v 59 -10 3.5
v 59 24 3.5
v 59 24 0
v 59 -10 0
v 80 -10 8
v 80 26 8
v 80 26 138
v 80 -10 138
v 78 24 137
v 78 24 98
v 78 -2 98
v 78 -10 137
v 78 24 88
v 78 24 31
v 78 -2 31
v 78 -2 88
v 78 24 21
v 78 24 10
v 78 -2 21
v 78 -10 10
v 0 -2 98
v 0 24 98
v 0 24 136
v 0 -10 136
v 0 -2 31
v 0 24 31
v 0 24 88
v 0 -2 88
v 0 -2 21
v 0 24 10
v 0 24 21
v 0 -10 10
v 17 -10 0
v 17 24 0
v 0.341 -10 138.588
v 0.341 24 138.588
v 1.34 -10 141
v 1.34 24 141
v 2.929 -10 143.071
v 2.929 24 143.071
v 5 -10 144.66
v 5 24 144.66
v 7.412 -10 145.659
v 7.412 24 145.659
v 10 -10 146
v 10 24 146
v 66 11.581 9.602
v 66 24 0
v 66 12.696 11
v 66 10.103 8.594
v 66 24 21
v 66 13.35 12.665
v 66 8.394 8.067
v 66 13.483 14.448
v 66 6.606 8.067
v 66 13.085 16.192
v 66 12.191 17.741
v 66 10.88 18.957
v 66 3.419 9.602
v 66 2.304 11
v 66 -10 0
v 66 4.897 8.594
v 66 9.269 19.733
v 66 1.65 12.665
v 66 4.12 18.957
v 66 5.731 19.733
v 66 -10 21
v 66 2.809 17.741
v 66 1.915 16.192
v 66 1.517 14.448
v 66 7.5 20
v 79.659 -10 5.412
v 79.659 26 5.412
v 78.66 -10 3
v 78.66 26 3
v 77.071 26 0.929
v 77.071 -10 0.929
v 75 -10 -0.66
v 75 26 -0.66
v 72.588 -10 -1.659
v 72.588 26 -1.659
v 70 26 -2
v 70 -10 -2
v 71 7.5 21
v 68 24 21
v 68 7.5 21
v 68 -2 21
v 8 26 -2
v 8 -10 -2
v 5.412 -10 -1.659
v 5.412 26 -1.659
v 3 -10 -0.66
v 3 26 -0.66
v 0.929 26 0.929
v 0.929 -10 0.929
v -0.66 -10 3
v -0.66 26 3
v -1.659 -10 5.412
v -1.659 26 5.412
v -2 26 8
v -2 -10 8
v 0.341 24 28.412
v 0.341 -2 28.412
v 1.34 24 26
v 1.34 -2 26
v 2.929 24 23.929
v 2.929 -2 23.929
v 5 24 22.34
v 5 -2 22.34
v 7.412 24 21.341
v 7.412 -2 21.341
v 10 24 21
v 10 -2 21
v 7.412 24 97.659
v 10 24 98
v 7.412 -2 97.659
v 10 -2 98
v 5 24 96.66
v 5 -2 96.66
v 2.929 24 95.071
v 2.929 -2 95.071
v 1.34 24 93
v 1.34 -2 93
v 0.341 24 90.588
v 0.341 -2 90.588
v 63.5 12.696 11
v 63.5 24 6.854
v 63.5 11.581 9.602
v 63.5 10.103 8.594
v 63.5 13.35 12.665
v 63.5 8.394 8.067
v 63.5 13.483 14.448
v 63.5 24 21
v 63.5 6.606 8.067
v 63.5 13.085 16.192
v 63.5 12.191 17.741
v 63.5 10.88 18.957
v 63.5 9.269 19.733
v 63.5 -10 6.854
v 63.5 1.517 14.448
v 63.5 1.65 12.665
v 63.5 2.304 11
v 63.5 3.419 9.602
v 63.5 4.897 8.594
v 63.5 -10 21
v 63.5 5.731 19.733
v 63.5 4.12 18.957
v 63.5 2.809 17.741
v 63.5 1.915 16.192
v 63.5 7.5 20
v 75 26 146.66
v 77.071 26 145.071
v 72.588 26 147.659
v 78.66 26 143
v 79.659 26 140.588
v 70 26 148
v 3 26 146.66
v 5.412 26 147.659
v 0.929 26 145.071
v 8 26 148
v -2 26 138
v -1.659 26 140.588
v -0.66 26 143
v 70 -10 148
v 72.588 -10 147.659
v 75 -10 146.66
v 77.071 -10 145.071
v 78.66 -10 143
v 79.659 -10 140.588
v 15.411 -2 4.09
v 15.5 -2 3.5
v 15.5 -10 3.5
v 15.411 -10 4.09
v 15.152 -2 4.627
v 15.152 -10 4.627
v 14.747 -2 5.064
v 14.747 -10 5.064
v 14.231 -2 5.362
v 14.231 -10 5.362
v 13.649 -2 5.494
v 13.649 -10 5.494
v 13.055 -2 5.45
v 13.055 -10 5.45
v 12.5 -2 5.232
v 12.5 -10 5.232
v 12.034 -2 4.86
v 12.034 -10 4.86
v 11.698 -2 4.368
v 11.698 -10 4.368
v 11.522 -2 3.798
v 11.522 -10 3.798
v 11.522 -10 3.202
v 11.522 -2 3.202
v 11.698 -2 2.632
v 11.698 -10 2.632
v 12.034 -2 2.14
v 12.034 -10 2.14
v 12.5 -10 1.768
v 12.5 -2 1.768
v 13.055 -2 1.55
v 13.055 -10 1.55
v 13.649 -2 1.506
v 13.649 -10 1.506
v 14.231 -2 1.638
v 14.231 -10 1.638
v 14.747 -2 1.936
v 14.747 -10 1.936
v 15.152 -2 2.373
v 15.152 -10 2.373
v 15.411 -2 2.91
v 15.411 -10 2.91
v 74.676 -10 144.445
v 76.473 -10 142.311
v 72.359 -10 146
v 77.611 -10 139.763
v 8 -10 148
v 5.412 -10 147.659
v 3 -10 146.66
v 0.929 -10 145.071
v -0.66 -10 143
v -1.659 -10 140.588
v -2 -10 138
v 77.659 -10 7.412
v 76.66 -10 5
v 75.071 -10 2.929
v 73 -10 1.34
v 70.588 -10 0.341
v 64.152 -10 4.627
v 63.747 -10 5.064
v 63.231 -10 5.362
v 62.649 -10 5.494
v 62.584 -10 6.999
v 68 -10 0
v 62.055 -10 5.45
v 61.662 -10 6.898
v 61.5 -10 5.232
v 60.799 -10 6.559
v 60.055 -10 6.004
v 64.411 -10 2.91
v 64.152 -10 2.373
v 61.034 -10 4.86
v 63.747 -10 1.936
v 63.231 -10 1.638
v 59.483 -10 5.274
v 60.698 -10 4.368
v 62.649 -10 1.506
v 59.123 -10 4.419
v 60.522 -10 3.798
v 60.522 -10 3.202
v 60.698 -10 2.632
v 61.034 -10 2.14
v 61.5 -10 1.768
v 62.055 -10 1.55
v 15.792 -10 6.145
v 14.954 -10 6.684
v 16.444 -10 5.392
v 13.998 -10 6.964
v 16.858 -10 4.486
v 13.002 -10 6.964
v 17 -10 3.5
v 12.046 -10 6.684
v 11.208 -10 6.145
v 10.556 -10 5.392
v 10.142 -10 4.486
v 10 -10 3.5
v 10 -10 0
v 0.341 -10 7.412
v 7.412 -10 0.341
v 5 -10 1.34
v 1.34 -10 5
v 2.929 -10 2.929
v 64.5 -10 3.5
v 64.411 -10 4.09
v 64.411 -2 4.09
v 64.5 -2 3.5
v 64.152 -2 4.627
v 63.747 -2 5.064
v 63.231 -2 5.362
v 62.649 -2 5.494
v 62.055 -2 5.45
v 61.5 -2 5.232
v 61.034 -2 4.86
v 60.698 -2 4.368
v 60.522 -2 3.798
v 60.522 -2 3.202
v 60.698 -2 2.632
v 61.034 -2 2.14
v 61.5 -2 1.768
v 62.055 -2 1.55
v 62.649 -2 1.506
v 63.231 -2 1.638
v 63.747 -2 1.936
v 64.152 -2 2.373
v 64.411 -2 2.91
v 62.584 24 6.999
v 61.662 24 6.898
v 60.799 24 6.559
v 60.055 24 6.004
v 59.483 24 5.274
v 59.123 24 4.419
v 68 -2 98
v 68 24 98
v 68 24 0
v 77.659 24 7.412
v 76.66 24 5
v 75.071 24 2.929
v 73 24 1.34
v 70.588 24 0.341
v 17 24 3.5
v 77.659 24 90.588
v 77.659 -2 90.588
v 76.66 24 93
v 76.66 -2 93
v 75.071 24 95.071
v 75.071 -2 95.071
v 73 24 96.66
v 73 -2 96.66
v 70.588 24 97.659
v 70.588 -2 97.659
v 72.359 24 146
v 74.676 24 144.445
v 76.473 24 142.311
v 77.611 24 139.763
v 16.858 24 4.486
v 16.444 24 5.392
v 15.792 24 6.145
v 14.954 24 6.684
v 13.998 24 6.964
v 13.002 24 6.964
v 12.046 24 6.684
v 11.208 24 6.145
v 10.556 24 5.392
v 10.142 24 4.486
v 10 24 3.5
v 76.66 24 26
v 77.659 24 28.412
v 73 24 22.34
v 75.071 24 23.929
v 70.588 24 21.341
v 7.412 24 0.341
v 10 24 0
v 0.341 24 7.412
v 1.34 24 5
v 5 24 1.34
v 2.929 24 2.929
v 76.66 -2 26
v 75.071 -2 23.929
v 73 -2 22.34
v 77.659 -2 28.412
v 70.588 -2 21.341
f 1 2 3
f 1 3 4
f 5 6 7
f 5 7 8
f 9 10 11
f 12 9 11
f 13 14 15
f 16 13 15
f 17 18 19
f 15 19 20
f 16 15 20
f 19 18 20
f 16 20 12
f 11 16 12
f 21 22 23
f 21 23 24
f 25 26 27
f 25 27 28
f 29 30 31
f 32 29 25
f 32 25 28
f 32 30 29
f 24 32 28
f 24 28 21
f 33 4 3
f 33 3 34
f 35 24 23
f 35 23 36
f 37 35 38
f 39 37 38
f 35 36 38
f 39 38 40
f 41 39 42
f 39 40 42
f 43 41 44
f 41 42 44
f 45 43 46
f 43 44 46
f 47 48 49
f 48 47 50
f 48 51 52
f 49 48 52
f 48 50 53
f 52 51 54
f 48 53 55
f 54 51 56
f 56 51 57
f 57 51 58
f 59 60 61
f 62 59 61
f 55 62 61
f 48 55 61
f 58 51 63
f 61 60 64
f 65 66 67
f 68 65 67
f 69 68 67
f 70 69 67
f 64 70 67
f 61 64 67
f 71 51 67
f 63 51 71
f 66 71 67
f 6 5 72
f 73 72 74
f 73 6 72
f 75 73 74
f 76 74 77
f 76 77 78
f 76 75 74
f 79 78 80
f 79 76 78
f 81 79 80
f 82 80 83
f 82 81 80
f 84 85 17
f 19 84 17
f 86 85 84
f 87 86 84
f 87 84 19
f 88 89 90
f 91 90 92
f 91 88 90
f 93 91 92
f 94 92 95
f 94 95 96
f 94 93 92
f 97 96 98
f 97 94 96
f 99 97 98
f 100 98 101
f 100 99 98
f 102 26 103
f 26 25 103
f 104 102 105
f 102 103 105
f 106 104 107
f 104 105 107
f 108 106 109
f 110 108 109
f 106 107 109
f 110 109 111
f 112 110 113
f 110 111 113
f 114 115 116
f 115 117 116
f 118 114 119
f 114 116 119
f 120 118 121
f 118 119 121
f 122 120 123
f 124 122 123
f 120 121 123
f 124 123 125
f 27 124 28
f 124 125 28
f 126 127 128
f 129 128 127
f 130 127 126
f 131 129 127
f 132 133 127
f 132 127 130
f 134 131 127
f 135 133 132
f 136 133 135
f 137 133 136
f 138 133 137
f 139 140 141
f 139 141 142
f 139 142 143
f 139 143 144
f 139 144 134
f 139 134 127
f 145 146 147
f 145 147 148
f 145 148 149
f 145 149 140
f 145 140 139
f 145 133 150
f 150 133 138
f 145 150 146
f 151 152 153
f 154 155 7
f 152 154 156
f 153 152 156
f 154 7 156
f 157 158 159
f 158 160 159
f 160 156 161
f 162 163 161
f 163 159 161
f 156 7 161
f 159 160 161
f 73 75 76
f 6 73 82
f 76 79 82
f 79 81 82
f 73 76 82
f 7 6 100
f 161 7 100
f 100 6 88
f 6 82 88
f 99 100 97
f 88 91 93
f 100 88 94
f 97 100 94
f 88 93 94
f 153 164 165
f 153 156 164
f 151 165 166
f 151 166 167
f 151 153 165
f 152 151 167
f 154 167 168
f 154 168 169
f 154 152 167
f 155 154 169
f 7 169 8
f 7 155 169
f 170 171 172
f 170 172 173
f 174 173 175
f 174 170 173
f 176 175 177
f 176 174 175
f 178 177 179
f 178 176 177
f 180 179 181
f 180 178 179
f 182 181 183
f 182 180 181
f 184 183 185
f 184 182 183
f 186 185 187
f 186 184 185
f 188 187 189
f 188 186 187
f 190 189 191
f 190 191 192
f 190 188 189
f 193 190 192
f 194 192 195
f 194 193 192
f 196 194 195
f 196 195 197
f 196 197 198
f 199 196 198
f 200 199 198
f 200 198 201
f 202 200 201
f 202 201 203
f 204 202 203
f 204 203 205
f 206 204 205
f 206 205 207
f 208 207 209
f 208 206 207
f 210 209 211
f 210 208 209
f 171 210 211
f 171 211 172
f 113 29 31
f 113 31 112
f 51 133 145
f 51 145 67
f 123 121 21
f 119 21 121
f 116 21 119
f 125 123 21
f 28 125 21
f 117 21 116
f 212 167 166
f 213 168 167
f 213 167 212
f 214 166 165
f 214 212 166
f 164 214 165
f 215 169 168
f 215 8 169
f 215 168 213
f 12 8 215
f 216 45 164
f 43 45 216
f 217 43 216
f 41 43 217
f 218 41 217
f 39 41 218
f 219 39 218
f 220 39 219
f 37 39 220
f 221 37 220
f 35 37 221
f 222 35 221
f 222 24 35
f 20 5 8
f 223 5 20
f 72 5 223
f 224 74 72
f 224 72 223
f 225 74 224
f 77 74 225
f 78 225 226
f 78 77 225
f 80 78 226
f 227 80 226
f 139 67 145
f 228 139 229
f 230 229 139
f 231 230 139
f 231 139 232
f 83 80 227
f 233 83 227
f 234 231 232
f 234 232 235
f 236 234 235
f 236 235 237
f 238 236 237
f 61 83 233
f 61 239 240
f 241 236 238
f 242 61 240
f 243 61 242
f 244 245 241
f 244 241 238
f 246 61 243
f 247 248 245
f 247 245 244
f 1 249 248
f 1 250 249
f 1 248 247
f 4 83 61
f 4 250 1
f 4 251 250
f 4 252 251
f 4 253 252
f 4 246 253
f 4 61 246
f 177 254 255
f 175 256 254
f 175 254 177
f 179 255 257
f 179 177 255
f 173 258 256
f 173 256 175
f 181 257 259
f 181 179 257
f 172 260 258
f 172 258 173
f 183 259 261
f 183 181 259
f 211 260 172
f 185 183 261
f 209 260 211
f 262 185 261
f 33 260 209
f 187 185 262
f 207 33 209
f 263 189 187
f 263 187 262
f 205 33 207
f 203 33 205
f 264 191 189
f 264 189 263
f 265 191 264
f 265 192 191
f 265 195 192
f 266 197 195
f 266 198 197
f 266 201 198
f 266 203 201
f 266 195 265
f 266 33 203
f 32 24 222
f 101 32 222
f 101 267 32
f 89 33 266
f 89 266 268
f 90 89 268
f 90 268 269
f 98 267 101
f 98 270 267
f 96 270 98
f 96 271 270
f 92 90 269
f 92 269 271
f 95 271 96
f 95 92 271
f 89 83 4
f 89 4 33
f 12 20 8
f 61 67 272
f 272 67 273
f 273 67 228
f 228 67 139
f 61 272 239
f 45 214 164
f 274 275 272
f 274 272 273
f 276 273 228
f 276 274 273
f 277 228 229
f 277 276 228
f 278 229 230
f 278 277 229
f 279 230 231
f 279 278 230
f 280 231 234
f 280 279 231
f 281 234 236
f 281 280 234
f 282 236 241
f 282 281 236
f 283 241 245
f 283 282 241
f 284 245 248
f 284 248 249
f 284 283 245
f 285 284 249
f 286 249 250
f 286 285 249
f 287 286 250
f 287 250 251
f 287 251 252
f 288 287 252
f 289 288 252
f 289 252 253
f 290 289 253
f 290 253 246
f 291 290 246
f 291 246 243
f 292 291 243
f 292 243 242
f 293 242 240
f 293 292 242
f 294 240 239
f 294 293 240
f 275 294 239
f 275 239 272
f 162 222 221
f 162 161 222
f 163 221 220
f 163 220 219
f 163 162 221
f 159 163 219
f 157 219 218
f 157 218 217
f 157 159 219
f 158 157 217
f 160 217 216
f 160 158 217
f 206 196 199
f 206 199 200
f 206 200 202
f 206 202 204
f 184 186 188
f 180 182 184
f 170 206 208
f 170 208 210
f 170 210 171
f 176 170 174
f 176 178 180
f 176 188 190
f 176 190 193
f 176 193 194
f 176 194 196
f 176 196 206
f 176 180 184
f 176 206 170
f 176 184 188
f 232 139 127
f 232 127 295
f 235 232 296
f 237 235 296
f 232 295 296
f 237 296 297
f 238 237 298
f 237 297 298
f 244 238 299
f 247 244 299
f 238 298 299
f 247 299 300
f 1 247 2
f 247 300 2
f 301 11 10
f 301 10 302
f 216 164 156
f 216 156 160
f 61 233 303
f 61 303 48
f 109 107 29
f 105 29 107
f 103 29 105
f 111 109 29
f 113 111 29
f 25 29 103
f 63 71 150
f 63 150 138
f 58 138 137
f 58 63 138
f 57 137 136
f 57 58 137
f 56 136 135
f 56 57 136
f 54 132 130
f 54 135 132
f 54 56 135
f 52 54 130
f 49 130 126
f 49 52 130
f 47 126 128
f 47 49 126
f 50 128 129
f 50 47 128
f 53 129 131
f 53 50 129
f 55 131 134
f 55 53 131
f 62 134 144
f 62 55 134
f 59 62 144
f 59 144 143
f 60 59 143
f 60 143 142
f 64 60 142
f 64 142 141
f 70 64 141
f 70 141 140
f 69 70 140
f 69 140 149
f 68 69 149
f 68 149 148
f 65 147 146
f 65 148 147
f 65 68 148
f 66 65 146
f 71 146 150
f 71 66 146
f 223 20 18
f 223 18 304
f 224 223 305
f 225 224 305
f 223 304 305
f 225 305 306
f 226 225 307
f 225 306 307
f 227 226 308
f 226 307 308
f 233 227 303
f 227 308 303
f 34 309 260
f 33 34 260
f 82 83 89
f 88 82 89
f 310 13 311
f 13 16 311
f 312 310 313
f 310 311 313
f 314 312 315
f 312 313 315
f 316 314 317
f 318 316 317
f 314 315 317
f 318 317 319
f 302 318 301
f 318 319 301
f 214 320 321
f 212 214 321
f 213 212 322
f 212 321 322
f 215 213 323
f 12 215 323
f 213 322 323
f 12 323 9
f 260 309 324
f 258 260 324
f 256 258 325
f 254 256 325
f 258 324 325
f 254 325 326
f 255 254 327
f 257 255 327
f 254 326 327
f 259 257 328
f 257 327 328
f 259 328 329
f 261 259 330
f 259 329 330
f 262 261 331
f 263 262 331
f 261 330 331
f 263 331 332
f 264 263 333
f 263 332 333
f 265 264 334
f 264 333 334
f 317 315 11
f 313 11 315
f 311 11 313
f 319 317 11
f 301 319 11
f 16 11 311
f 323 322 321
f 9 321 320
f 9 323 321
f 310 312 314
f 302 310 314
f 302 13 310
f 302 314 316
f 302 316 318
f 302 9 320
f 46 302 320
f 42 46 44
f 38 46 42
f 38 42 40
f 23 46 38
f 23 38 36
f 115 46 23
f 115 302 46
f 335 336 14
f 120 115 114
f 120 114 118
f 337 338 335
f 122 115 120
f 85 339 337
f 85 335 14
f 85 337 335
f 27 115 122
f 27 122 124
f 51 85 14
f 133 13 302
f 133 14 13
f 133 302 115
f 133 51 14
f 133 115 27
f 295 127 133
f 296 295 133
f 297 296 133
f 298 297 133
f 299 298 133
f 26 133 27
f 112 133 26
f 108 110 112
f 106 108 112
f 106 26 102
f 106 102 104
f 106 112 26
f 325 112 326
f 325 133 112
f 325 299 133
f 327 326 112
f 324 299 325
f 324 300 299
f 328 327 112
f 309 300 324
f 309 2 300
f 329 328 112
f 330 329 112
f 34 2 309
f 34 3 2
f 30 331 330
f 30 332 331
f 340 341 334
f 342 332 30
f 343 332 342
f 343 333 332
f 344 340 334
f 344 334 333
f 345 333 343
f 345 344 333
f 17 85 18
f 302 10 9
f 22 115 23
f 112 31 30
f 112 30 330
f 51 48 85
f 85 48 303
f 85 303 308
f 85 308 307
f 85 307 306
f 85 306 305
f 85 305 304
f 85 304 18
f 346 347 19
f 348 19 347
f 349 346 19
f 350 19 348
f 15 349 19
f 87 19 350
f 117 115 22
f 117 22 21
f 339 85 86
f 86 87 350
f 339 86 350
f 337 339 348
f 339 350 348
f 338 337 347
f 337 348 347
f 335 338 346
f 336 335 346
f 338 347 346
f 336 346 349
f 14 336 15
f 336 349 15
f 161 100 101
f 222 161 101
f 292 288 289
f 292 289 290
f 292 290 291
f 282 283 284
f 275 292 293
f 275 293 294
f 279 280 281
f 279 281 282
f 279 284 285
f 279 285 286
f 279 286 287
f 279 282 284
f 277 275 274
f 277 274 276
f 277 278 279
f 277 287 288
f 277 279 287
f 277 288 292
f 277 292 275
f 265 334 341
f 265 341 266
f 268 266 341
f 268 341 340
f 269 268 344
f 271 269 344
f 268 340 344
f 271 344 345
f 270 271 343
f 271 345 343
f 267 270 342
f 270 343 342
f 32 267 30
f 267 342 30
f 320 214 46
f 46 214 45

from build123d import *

# Parameters (mm, degrees)
CYLINDER022_R             = 2
CYLINDER022_DEPTH         = 8
CYLINDER026_R             = 7
CYLINDER026_DEPTH         = 5
CYLINDER025_R             = 6
CYLINDER025_DEPTH         = 20
FUSION007_PLACEMENT_ANGLE = 270
CYLINDER024_R             = 2
CYLINDER024_DEPTH         = 8
CYLINDER023_R             = 3.5
CYLINDER023_DEPTH         = 34
BOX022_W                  = 7
BOX022_H                  = 34
BOX022_DEPTH              = 3.5
BOX023_W                  = 7
BOX023_H                  = 34
BOX023_DEPTH              = 3.5
BOX024_W                  = 2.5
BOX024_H                  = 34
BOX024_DEPTH              = 17.5
CYLINDER017_W             = 10
CYLINDER017_H             = 26
CYLINDER017_ANGLE         = 90
BOX018_W                  = 10
BOX018_H                  = 26
BOX018_DEPTH              = 10
CUT018_PLACEMENT_ANGLE    = 180
CYLINDER018_W             = 10
CYLINDER018_H             = 26
CYLINDER018_ANGLE         = 90
BOX019_W                  = 10
BOX019_H                  = 26
BOX019_DEPTH              = 10
CUT019_PLACEMENT_ANGLE    = 270
CYLINDER019_W             = 10
CYLINDER019_H             = 26
CYLINDER019_ANGLE         = 90
BOX020_W                  = 10
BOX020_H                  = 26
BOX020_DEPTH              = 10
CYLINDER020_W             = 10
CYLINDER020_H             = 26
CYLINDER020_ANGLE         = 90
BOX021_W                  = 10
BOX021_H                  = 26
BOX021_DEPTH              = 10
CUT021_PLACEMENT_ANGLE    = 270
CYLINDER014_W             = 10
CYLINDER014_H             = 34
CYLINDER014_ANGLE         = 90
BOX015_W                  = 10
BOX015_H                  = 34
BOX015_DEPTH              = 10
CUT013_PLACEMENT_ANGLE    = 180
CYLINDER015_W             = 10
CYLINDER015_H             = 34
CYLINDER015_ANGLE         = 90
BOX016_W                  = 10
BOX016_H                  = 34
BOX016_DEPTH              = 10
CUT014_PLACEMENT_ANGLE    = 180
CYLINDER016_W             = 10
CYLINDER016_H             = 34
CYLINDER016_ANGLE         = 90
BOX017_W                  = 10
BOX017_H                  = 34
BOX017_DEPTH              = 10
CUT015_PITCH_ANGLE        = -90
CUT015_PLACEMENT_ANGLE    = 180
CYLINDER013_W             = 10
CYLINDER013_H             = 34
CYLINDER013_ANGLE         = 90
BOX013_W                  = 10
BOX013_H                  = 34
BOX013_DEPTH              = 10
CUT012_PITCH_ANGLE        = 90
CUT012_PLACEMENT_ANGLE    = -180
BOX014_W                  = 78
BOX014_H                  = 34
BOX014_DEPTH              = 146
CYLINDER009_W             = 10
CYLINDER009_H             = 36
CYLINDER009_ANGLE         = 90
BOX009_W                  = 10
BOX009_H                  = 36
BOX009_DEPTH              = 10
CUT007_PLACEMENT_ANGLE    = 180
CYLINDER010_W             = 10
CYLINDER010_H             = 36
CYLINDER010_ANGLE         = 90
BOX010_W                  = 10
BOX010_H                  = 36
BOX010_DEPTH              = 10
CUT008_PLACEMENT_ANGLE    = 180
CYLINDER011_W             = 10
CYLINDER011_H             = 36
CYLINDER011_ANGLE         = 90
BOX011_W                  = 10
BOX011_H                  = 36
BOX011_DEPTH              = 10
CUT009_PITCH_ANGLE        = -90
CUT009_PLACEMENT_ANGLE    = -180
CYLINDER008_W             = 10
CYLINDER008_H             = 36
CYLINDER008_ANGLE         = 90
BOX007_W                  = 10
BOX007_H                  = 36
BOX007_DEPTH              = 10
CUT006_PITCH_ANGLE        = 90
CUT006_PLACEMENT_ANGLE    = -180
BOX008_W                  = 82
BOX008_H                  = 36
BOX008_DEPTH              = 150
CYLINDER021_R             = 3.5
CYLINDER021_DEPTH         = 34


with BuildPart() as cylinder022:
    # Cylinder022 → Cylinder022 (new body)
    with BuildSketch(Plane(origin=(13.5, -2, 3.5), x_dir=(1, 0, 0), z_dir=(0, -1, 0))):
        Circle(CYLINDER022_R)
    extrude(amount=CYLINDER022_DEPTH)


with BuildPart() as cylinder026:
    # Cylinder026 → Cylinder026 (new body)
    with BuildSketch(Plane.XY):
        Circle(CYLINDER026_R)
    extrude(amount=CYLINDER026_DEPTH)


with BuildPart() as powerswitch:
    # Cylinder025 → Cylinder025 (new body)
    with BuildSketch(Plane.XY):
        Circle(CYLINDER025_R)
    extrude(amount=CYLINDER025_DEPTH)

    # Fusion007: union Cylinder026
    add(cylinder026.part)


with BuildPart() as powerswitch_1:
    # Fusion007 placement: moved
    add(powerswitch.part.moved(Location((71, 7.5, 14))).rotate(Axis((71, 7.5, 14), (0, 1, 0)), FUSION007_PLACEMENT_ANGLE))


with BuildPart() as basecuts:
    # Cylinder024 → Cylinder024 (new body)
    with BuildSketch(Plane(origin=(62.5, -2, 3.5), x_dir=(1, 0, 0), z_dir=(0, -1, 0))):
        Circle(CYLINDER024_R)
    extrude(amount=CYLINDER024_DEPTH)

    # Fusion010: union Cylinder022, powerSwitch
    add(cylinder022.part)
    add(powerswitch_1.part)


with BuildPart() as cylinder023:
    # Cylinder023 → Cylinder023 (new body)
    with BuildSketch(Plane(origin=(62.5, 24, 3.5), x_dir=(1, 0, 0), z_dir=(0, -1, 0))):
        Circle(CYLINDER023_R)
    extrude(amount=CYLINDER023_DEPTH)


with BuildPart() as cube017:
    # Box022 → Box022 (new body)
    with BuildSketch(Plane(origin=(10, 24, 3.5), x_dir=(1, 0, 0), z_dir=(0, 0, -1))):
        with Locations((3.5, 17)):
            Rectangle(BOX022_W, BOX022_H)
    extrude(amount=BOX022_DEPTH)


with BuildPart() as cube018:
    # Box023 → Box023 (new body)
    with BuildSketch(Plane(origin=(59, 24, 3.5), x_dir=(1, 0, 0), z_dir=(0, 0, -1))):
        with Locations((3.5, 17)):
            Rectangle(BOX023_W, BOX023_H)
    extrude(amount=BOX023_DEPTH)


with BuildPart() as cube019:
    # Box024 → Box024 (new body)
    with BuildSketch(Plane(origin=(63.5, 24, 21), x_dir=(1, 0, 0), z_dir=(0, 0, -1))):
        with Locations((1.25, 17)):
            Rectangle(BOX024_W, BOX024_H)
    extrude(amount=BOX024_DEPTH)


with BuildPart() as cylinder017:
    # Cylinder017 → Cylinder017 (revolve)
    with BuildSketch(Plane(origin=(0, 26, 0), x_dir=(1, 0, 0), z_dir=(0, 0, -1))):
        with Locations((5, 13)):
            Rectangle(CYLINDER017_W, CYLINDER017_H)
    revolve(axis=Axis((0, 26, 0), (0, -1, 0)), revolution_arc=CYLINDER017_ANGLE)


with BuildPart() as batterysupport:
    # Box018 → Box018 (new body)
    with BuildSketch(Plane(origin=(10, 26, 0), x_dir=(-1, 0, 0), z_dir=(0, 0, 1))):
        with Locations((5, 13)):
            Rectangle(BOX018_W, BOX018_H)
    extrude(amount=BOX018_DEPTH)

    # Cut018: cut Cylinder017
    add(cylinder017.part, mode=Mode.SUBTRACT)


with BuildPart() as batterysupport_1:
    # Cut018 placement: moved
    add(batterysupport.part.moved(Location((10, -2, 31))).rotate(Axis((10, -2, 31), (0, 1, 0)), CUT018_PLACEMENT_ANGLE))


with BuildPart() as cylinder018:
    # Cylinder018 → Cylinder018 (revolve)
    with BuildSketch(Plane(origin=(0, 26, 0), x_dir=(1, 0, 0), z_dir=(0, 0, -1))):
        with Locations((5, 13)):
            Rectangle(CYLINDER018_W, CYLINDER018_H)
    revolve(axis=Axis((0, 26, 0), (0, -1, 0)), revolution_arc=CYLINDER018_ANGLE)


with BuildPart() as batterysupport001:
    # Box019 → Box019 (new body)
    with BuildSketch(Plane(origin=(10, 26, 0), x_dir=(-1, 0, 0), z_dir=(0, 0, 1))):
        with Locations((5, 13)):
            Rectangle(BOX019_W, BOX019_H)
    extrude(amount=BOX019_DEPTH)

    # Cut019: cut Cylinder018
    add(cylinder018.part, mode=Mode.SUBTRACT)


with BuildPart() as batterysupport001_1:
    # Cut019 placement: moved
    add(batterysupport001.part.moved(Location((68, -2, 31))).rotate(Axis((68, -2, 31), (0, -1, 0)), CUT019_PLACEMENT_ANGLE))


with BuildPart() as cylinder019:
    # Cylinder019 → Cylinder019 (revolve)
    with BuildSketch(Plane(origin=(0, 26, 0), x_dir=(1, 0, 0), z_dir=(0, 0, -1))):
        with Locations((5, 13)):
            Rectangle(CYLINDER019_W, CYLINDER019_H)
    revolve(axis=Axis((0, 26, 0), (0, -1, 0)), revolution_arc=CYLINDER019_ANGLE)


with BuildPart() as batterysupport002:
    # Box020 → Box020 (new body)
    with BuildSketch(Plane(origin=(10, 26, 0), x_dir=(-1, 0, 0), z_dir=(0, 0, 1))):
        with Locations((5, 13)):
            Rectangle(BOX020_W, BOX020_H)
    extrude(amount=BOX020_DEPTH)

    # Cut020: cut Cylinder019
    add(cylinder019.part, mode=Mode.SUBTRACT)


with BuildPart() as batterysupport002_1:
    # Cut020 placement: moved
    add(batterysupport002.part.moved(Location((68, -2, 88))))


with BuildPart() as cylinder020:
    # Cylinder020 → Cylinder020 (revolve)
    with BuildSketch(Plane(origin=(0, 26, 0), x_dir=(1, 0, 0), z_dir=(0, 0, -1))):
        with Locations((5, 13)):
            Rectangle(CYLINDER020_W, CYLINDER020_H)
    revolve(axis=Axis((0, 26, 0), (0, -1, 0)), revolution_arc=CYLINDER020_ANGLE)


with BuildPart() as batterysupport003:
    # Box021 → Box021 (new body)
    with BuildSketch(Plane(origin=(10, 26, 0), x_dir=(-1, 0, 0), z_dir=(0, 0, 1))):
        with Locations((5, 13)):
            Rectangle(BOX021_W, BOX021_H)
    extrude(amount=BOX021_DEPTH)

    # Cut021: cut Cylinder020
    add(cylinder020.part, mode=Mode.SUBTRACT)


with BuildPart() as batterysupport003_1:
    # Cut021 placement: moved
    add(batterysupport003.part.moved(Location((10, -2, 88))).rotate(Axis((10, -2, 88), (0, 1, 0)), CUT021_PLACEMENT_ANGLE))


with BuildPart() as cylinder014:
    # Cylinder014 → Cylinder014 (revolve)
    with BuildSketch(Plane(origin=(0, 26, 0), x_dir=(1, 0, 0), z_dir=(0, 0, -1))):
        with Locations((5, 17)):
            Rectangle(CYLINDER014_W, CYLINDER014_H)
    revolve(axis=Axis((0, 26, 0), (0, -1, 0)), revolution_arc=CYLINDER014_ANGLE)


with BuildPart() as cut013:
    # Box015 → Box015 (new body)
    with BuildSketch(Plane(origin=(0, -8, 0), x_dir=(1, 0, 0), z_dir=(0, 0, 1))):
        with Locations((5, 17)):
            Rectangle(BOX015_W, BOX015_H)
    extrude(amount=BOX015_DEPTH)

    # Cut013: cut Cylinder014
    add(cylinder014.part, mode=Mode.SUBTRACT)


with BuildPart() as cut013_1:
    # Cut013 placement: moved
    add(cut013.part.moved(Location((70, 18, 8))).rotate(Axis((70, 18, 8), (1, 0, 0)), CUT013_PLACEMENT_ANGLE))


with BuildPart() as cylinder015:
    # Cylinder015 → Cylinder015 (revolve)
    with BuildSketch(Plane(origin=(0, 26, 0), x_dir=(1, 0, 0), z_dir=(0, 0, -1))):
        with Locations((5, 17)):
            Rectangle(CYLINDER015_W, CYLINDER015_H)
    revolve(axis=Axis((0, 26, 0), (0, -1, 0)), revolution_arc=CYLINDER015_ANGLE)


with BuildPart() as cut014:
    # Box016 → Box016 (new body)
    with BuildSketch(Plane(origin=(0, -8, 0), x_dir=(1, 0, 0), z_dir=(0, 0, 1))):
        with Locations((5, 17)):
            Rectangle(BOX016_W, BOX016_H)
    extrude(amount=BOX016_DEPTH)

    # Cut014: cut Cylinder015
    add(cylinder015.part, mode=Mode.SUBTRACT)


with BuildPart() as cut014_1:
    # Cut014 placement: moved
    add(cut014.part.moved(Location((12, 18, 134))).rotate(Axis((12, 18, 134), (0, 0, 1)), CUT014_PLACEMENT_ANGLE))


with BuildPart() as cylinder016:
    # Cylinder016 → Cylinder016 (revolve)
    with BuildSketch(Plane(origin=(0, 26, 0), x_dir=(1, 0, 0), z_dir=(0, 0, -1))):
        with Locations((5, 17)):
            Rectangle(CYLINDER016_W, CYLINDER016_H)
    revolve(axis=Axis((0, 26, 0), (0, -1, 0)), revolution_arc=CYLINDER016_ANGLE)


with BuildPart() as cut015:
    # Box017 → Box017 (new body)
    with BuildSketch(Plane(origin=(0, -8, 0), x_dir=(1, 0, 0), z_dir=(0, 0, 1))):
        with Locations((5, 17)):
            Rectangle(BOX017_W, BOX017_H)
    extrude(amount=BOX017_DEPTH)

    # Cut015: cut Cylinder016
    add(cylinder016.part, mode=Mode.SUBTRACT)


with BuildPart() as cut015_1:
    # Cut015 pitch: moved
    add(cut015.part.rotate(Axis((0, 0, 0), (0, 1, 0)), CUT015_PITCH_ANGLE))


with BuildPart() as cut015_2:
    # Cut015 placement: moved
    add(cut015_1.part.moved(Location((70, 18, 135))).rotate(Axis((70, 18, 135), (0, 0, 1)), CUT015_PLACEMENT_ANGLE))


with BuildPart() as cylinder013:
    # Cylinder013 → Cylinder013 (revolve)
    with BuildSketch(Plane(origin=(0, 26, 0), x_dir=(1, 0, 0), z_dir=(0, 0, -1))):
        with Locations((5, 17)):
            Rectangle(CYLINDER013_W, CYLINDER013_H)
    revolve(axis=Axis((0, 26, 0), (0, -1, 0)), revolution_arc=CYLINDER013_ANGLE)


with BuildPart() as fusion006:
    # Box013 → Box013 (new body)
    with BuildSketch(Plane(origin=(0, -8, 0), x_dir=(1, 0, 0), z_dir=(0, 0, 1))):
        with Locations((5, 17)):
            Rectangle(BOX013_W, BOX013_H)
    extrude(amount=BOX013_DEPTH)

    # Cut012: cut Cylinder013
    add(cylinder013.part, mode=Mode.SUBTRACT)


with BuildPart() as fusion006_1:
    # Cut012 pitch: moved
    add(fusion006.part.rotate(Axis((0, 0, 0), (0, 1, 0)), CUT012_PITCH_ANGLE))


with BuildPart() as fusion006_2:
    # Cut012 placement: moved
    add(fusion006_1.part.moved(Location((12, 18, 8))).rotate(Axis((12, 18, 8), (0, 0, 1)), CUT012_PLACEMENT_ANGLE))

    # Fusion006: union Cut013, Cut014, Cut015
    add(cut013_1.part)
    add(cut014_1.part)
    add(cut015_2.part)


with BuildPart() as baseout001:
    # Box014 → Box014 (new body)
    with BuildSketch(Plane(origin=(80, 26, -2), x_dir=(-1, 0, 0), z_dir=(0, 0, 1))):
        with Locations((39, 17)):
            Rectangle(BOX014_W, BOX014_H)
    extrude(amount=BOX014_DEPTH)

    # Cut016: cut Fusion006
    add(fusion006_2.part, mode=Mode.SUBTRACT)


with BuildPart() as baseout001_1:
    # Cut016 placement: moved
    add(baseout001.part.moved(Location((-2, -2, 2))))


with BuildPart() as cylinder009:
    # Cylinder009 → Cylinder009 (revolve)
    with BuildSketch(Plane(origin=(0, 26, 0), x_dir=(1, 0, 0), z_dir=(0, 0, -1))):
        with Locations((5, 18)):
            Rectangle(CYLINDER009_W, CYLINDER009_H)
    revolve(axis=Axis((0, 26, 0), (0, -1, 0)), revolution_arc=CYLINDER009_ANGLE)


with BuildPart() as cut007:
    # Box009 → Box009 (new body)
    with BuildSketch(Plane(origin=(0, -10, 0), x_dir=(1, 0, 0), z_dir=(0, 0, 1))):
        with Locations((5, 18)):
            Rectangle(BOX009_W, BOX009_H)
    extrude(amount=BOX009_DEPTH)

    # Cut007: cut Cylinder009
    add(cylinder009.part, mode=Mode.SUBTRACT)


with BuildPart() as cut007_1:
    # Cut007 placement: moved
    add(cut007.part.moved(Location((70, 18, 8))).rotate(Axis((70, 18, 8), (1, 0, 0)), CUT007_PLACEMENT_ANGLE))


with BuildPart() as cylinder010:
    # Cylinder010 → Cylinder010 (revolve)
    with BuildSketch(Plane(origin=(0, 26, 0), x_dir=(1, 0, 0), z_dir=(0, 0, -1))):
        with Locations((5, 18)):
            Rectangle(CYLINDER010_W, CYLINDER010_H)
    revolve(axis=Axis((0, 26, 0), (0, -1, 0)), revolution_arc=CYLINDER010_ANGLE)


with BuildPart() as cut008:
    # Box010 → Box010 (new body)
    with BuildSketch(Plane(origin=(0, -10, 0), x_dir=(1, 0, 0), z_dir=(0, 0, 1))):
        with Locations((5, 18)):
            Rectangle(BOX010_W, BOX010_H)
    extrude(amount=BOX010_DEPTH)

    # Cut008: cut Cylinder010
    add(cylinder010.part, mode=Mode.SUBTRACT)


with BuildPart() as cut008_1:
    # Cut008 placement: moved
    add(cut008.part.moved(Location((8, 18, 138))).rotate(Axis((8, 18, 138), (0, 0, 1)), CUT008_PLACEMENT_ANGLE))


with BuildPart() as cylinder011:
    # Cylinder011 → Cylinder011 (revolve)
    with BuildSketch(Plane(origin=(0, 26, 0), x_dir=(1, 0, 0), z_dir=(0, 0, -1))):
        with Locations((5, 18)):
            Rectangle(CYLINDER011_W, CYLINDER011_H)
    revolve(axis=Axis((0, 26, 0), (0, -1, 0)), revolution_arc=CYLINDER011_ANGLE)


with BuildPart() as cut009:
    # Box011 → Box011 (new body)
    with BuildSketch(Plane(origin=(0, -10, 0), x_dir=(1, 0, 0), z_dir=(0, 0, 1))):
        with Locations((5, 18)):
            Rectangle(BOX011_W, BOX011_H)
    extrude(amount=BOX011_DEPTH)

    # Cut009: cut Cylinder011
    add(cylinder011.part, mode=Mode.SUBTRACT)


with BuildPart() as cut009_1:
    # Cut009 pitch: moved
    add(cut009.part.rotate(Axis((0, 0, 0), (0, 1, 0)), CUT009_PITCH_ANGLE))


with BuildPart() as cut009_2:
    # Cut009 placement: moved
    add(cut009_1.part.moved(Location((70, 18, 138))).rotate(Axis((70, 18, 138), (0, 0, 1)), CUT009_PLACEMENT_ANGLE))


with BuildPart() as cylinder008:
    # Cylinder008 → Cylinder008 (revolve)
    with BuildSketch(Plane(origin=(0, 26, 0), x_dir=(1, 0, 0), z_dir=(0, 0, -1))):
        with Locations((5, 18)):
            Rectangle(CYLINDER008_W, CYLINDER008_H)
    revolve(axis=Axis((0, 26, 0), (0, -1, 0)), revolution_arc=CYLINDER008_ANGLE)


with BuildPart() as fusion005:
    # Box007 → Box007 (new body)
    with BuildSketch(Plane(origin=(0, -10, 0), x_dir=(1, 0, 0), z_dir=(0, 0, 1))):
        with Locations((5, 18)):
            Rectangle(BOX007_W, BOX007_H)
    extrude(amount=BOX007_DEPTH)

    # Cut006: cut Cylinder008
    add(cylinder008.part, mode=Mode.SUBTRACT)


with BuildPart() as fusion005_1:
    # Cut006 pitch: moved
    add(fusion005.part.rotate(Axis((0, 0, 0), (0, 1, 0)), CUT006_PITCH_ANGLE))


with BuildPart() as fusion005_2:
    # Cut006 placement: moved
    add(fusion005_1.part.moved(Location((8, 18, 8))).rotate(Axis((8, 18, 8), (0, 0, 1)), CUT006_PLACEMENT_ANGLE))

    # Fusion005: union Cut007, Cut008, Cut009
    add(cut007_1.part)
    add(cut008_1.part)
    add(cut009_2.part)


with BuildPart() as fusion005_3:
    # Fusion005 placement: moved
    add(fusion005_2.part.moved(Location((0, -2, 0))))


with BuildPart() as base:
    # Box008 → Box008 (new body)
    with BuildSketch(Plane(origin=(80, 26, -2), x_dir=(-1, 0, 0), z_dir=(0, 0, 1))):
        with Locations((41, 18)):
            Rectangle(BOX008_W, BOX008_H)
    extrude(amount=BOX008_DEPTH)

    # Cut010: cut Fusion005
    add(fusion005_3.part, mode=Mode.SUBTRACT)

    # Cut017: cut BaseOut001
    add(baseout001_1.part, mode=Mode.SUBTRACT)

    # Fusion008: union batterySupport, batterySupport001, batterySupport002, batterySupport003
    add(batterysupport_1.part)
    add(batterysupport001_1.part)
    add(batterysupport002_1.part)
    add(batterysupport003_1.part)


with BuildPart() as basecuts001:
    # Cylinder021 → Cylinder021 (new body)
    with BuildSketch(Plane(origin=(13.5, 24, 3.5), x_dir=(1, 0, 0), z_dir=(0, -1, 0))):
        Circle(CYLINDER021_R)
    extrude(amount=CYLINDER021_DEPTH)

    # Fusion009: union Cylinder023, Cube017, Cube018, Cube019, base
    add(cylinder023.part)
    add(cube017.part)
    add(cube018.part)
    add(cube019.part)
    add(base.part)

    # Cut022: cut baseCuts
    add(basecuts.part, mode=Mode.SUBTRACT)


solid = basecuts001.part
